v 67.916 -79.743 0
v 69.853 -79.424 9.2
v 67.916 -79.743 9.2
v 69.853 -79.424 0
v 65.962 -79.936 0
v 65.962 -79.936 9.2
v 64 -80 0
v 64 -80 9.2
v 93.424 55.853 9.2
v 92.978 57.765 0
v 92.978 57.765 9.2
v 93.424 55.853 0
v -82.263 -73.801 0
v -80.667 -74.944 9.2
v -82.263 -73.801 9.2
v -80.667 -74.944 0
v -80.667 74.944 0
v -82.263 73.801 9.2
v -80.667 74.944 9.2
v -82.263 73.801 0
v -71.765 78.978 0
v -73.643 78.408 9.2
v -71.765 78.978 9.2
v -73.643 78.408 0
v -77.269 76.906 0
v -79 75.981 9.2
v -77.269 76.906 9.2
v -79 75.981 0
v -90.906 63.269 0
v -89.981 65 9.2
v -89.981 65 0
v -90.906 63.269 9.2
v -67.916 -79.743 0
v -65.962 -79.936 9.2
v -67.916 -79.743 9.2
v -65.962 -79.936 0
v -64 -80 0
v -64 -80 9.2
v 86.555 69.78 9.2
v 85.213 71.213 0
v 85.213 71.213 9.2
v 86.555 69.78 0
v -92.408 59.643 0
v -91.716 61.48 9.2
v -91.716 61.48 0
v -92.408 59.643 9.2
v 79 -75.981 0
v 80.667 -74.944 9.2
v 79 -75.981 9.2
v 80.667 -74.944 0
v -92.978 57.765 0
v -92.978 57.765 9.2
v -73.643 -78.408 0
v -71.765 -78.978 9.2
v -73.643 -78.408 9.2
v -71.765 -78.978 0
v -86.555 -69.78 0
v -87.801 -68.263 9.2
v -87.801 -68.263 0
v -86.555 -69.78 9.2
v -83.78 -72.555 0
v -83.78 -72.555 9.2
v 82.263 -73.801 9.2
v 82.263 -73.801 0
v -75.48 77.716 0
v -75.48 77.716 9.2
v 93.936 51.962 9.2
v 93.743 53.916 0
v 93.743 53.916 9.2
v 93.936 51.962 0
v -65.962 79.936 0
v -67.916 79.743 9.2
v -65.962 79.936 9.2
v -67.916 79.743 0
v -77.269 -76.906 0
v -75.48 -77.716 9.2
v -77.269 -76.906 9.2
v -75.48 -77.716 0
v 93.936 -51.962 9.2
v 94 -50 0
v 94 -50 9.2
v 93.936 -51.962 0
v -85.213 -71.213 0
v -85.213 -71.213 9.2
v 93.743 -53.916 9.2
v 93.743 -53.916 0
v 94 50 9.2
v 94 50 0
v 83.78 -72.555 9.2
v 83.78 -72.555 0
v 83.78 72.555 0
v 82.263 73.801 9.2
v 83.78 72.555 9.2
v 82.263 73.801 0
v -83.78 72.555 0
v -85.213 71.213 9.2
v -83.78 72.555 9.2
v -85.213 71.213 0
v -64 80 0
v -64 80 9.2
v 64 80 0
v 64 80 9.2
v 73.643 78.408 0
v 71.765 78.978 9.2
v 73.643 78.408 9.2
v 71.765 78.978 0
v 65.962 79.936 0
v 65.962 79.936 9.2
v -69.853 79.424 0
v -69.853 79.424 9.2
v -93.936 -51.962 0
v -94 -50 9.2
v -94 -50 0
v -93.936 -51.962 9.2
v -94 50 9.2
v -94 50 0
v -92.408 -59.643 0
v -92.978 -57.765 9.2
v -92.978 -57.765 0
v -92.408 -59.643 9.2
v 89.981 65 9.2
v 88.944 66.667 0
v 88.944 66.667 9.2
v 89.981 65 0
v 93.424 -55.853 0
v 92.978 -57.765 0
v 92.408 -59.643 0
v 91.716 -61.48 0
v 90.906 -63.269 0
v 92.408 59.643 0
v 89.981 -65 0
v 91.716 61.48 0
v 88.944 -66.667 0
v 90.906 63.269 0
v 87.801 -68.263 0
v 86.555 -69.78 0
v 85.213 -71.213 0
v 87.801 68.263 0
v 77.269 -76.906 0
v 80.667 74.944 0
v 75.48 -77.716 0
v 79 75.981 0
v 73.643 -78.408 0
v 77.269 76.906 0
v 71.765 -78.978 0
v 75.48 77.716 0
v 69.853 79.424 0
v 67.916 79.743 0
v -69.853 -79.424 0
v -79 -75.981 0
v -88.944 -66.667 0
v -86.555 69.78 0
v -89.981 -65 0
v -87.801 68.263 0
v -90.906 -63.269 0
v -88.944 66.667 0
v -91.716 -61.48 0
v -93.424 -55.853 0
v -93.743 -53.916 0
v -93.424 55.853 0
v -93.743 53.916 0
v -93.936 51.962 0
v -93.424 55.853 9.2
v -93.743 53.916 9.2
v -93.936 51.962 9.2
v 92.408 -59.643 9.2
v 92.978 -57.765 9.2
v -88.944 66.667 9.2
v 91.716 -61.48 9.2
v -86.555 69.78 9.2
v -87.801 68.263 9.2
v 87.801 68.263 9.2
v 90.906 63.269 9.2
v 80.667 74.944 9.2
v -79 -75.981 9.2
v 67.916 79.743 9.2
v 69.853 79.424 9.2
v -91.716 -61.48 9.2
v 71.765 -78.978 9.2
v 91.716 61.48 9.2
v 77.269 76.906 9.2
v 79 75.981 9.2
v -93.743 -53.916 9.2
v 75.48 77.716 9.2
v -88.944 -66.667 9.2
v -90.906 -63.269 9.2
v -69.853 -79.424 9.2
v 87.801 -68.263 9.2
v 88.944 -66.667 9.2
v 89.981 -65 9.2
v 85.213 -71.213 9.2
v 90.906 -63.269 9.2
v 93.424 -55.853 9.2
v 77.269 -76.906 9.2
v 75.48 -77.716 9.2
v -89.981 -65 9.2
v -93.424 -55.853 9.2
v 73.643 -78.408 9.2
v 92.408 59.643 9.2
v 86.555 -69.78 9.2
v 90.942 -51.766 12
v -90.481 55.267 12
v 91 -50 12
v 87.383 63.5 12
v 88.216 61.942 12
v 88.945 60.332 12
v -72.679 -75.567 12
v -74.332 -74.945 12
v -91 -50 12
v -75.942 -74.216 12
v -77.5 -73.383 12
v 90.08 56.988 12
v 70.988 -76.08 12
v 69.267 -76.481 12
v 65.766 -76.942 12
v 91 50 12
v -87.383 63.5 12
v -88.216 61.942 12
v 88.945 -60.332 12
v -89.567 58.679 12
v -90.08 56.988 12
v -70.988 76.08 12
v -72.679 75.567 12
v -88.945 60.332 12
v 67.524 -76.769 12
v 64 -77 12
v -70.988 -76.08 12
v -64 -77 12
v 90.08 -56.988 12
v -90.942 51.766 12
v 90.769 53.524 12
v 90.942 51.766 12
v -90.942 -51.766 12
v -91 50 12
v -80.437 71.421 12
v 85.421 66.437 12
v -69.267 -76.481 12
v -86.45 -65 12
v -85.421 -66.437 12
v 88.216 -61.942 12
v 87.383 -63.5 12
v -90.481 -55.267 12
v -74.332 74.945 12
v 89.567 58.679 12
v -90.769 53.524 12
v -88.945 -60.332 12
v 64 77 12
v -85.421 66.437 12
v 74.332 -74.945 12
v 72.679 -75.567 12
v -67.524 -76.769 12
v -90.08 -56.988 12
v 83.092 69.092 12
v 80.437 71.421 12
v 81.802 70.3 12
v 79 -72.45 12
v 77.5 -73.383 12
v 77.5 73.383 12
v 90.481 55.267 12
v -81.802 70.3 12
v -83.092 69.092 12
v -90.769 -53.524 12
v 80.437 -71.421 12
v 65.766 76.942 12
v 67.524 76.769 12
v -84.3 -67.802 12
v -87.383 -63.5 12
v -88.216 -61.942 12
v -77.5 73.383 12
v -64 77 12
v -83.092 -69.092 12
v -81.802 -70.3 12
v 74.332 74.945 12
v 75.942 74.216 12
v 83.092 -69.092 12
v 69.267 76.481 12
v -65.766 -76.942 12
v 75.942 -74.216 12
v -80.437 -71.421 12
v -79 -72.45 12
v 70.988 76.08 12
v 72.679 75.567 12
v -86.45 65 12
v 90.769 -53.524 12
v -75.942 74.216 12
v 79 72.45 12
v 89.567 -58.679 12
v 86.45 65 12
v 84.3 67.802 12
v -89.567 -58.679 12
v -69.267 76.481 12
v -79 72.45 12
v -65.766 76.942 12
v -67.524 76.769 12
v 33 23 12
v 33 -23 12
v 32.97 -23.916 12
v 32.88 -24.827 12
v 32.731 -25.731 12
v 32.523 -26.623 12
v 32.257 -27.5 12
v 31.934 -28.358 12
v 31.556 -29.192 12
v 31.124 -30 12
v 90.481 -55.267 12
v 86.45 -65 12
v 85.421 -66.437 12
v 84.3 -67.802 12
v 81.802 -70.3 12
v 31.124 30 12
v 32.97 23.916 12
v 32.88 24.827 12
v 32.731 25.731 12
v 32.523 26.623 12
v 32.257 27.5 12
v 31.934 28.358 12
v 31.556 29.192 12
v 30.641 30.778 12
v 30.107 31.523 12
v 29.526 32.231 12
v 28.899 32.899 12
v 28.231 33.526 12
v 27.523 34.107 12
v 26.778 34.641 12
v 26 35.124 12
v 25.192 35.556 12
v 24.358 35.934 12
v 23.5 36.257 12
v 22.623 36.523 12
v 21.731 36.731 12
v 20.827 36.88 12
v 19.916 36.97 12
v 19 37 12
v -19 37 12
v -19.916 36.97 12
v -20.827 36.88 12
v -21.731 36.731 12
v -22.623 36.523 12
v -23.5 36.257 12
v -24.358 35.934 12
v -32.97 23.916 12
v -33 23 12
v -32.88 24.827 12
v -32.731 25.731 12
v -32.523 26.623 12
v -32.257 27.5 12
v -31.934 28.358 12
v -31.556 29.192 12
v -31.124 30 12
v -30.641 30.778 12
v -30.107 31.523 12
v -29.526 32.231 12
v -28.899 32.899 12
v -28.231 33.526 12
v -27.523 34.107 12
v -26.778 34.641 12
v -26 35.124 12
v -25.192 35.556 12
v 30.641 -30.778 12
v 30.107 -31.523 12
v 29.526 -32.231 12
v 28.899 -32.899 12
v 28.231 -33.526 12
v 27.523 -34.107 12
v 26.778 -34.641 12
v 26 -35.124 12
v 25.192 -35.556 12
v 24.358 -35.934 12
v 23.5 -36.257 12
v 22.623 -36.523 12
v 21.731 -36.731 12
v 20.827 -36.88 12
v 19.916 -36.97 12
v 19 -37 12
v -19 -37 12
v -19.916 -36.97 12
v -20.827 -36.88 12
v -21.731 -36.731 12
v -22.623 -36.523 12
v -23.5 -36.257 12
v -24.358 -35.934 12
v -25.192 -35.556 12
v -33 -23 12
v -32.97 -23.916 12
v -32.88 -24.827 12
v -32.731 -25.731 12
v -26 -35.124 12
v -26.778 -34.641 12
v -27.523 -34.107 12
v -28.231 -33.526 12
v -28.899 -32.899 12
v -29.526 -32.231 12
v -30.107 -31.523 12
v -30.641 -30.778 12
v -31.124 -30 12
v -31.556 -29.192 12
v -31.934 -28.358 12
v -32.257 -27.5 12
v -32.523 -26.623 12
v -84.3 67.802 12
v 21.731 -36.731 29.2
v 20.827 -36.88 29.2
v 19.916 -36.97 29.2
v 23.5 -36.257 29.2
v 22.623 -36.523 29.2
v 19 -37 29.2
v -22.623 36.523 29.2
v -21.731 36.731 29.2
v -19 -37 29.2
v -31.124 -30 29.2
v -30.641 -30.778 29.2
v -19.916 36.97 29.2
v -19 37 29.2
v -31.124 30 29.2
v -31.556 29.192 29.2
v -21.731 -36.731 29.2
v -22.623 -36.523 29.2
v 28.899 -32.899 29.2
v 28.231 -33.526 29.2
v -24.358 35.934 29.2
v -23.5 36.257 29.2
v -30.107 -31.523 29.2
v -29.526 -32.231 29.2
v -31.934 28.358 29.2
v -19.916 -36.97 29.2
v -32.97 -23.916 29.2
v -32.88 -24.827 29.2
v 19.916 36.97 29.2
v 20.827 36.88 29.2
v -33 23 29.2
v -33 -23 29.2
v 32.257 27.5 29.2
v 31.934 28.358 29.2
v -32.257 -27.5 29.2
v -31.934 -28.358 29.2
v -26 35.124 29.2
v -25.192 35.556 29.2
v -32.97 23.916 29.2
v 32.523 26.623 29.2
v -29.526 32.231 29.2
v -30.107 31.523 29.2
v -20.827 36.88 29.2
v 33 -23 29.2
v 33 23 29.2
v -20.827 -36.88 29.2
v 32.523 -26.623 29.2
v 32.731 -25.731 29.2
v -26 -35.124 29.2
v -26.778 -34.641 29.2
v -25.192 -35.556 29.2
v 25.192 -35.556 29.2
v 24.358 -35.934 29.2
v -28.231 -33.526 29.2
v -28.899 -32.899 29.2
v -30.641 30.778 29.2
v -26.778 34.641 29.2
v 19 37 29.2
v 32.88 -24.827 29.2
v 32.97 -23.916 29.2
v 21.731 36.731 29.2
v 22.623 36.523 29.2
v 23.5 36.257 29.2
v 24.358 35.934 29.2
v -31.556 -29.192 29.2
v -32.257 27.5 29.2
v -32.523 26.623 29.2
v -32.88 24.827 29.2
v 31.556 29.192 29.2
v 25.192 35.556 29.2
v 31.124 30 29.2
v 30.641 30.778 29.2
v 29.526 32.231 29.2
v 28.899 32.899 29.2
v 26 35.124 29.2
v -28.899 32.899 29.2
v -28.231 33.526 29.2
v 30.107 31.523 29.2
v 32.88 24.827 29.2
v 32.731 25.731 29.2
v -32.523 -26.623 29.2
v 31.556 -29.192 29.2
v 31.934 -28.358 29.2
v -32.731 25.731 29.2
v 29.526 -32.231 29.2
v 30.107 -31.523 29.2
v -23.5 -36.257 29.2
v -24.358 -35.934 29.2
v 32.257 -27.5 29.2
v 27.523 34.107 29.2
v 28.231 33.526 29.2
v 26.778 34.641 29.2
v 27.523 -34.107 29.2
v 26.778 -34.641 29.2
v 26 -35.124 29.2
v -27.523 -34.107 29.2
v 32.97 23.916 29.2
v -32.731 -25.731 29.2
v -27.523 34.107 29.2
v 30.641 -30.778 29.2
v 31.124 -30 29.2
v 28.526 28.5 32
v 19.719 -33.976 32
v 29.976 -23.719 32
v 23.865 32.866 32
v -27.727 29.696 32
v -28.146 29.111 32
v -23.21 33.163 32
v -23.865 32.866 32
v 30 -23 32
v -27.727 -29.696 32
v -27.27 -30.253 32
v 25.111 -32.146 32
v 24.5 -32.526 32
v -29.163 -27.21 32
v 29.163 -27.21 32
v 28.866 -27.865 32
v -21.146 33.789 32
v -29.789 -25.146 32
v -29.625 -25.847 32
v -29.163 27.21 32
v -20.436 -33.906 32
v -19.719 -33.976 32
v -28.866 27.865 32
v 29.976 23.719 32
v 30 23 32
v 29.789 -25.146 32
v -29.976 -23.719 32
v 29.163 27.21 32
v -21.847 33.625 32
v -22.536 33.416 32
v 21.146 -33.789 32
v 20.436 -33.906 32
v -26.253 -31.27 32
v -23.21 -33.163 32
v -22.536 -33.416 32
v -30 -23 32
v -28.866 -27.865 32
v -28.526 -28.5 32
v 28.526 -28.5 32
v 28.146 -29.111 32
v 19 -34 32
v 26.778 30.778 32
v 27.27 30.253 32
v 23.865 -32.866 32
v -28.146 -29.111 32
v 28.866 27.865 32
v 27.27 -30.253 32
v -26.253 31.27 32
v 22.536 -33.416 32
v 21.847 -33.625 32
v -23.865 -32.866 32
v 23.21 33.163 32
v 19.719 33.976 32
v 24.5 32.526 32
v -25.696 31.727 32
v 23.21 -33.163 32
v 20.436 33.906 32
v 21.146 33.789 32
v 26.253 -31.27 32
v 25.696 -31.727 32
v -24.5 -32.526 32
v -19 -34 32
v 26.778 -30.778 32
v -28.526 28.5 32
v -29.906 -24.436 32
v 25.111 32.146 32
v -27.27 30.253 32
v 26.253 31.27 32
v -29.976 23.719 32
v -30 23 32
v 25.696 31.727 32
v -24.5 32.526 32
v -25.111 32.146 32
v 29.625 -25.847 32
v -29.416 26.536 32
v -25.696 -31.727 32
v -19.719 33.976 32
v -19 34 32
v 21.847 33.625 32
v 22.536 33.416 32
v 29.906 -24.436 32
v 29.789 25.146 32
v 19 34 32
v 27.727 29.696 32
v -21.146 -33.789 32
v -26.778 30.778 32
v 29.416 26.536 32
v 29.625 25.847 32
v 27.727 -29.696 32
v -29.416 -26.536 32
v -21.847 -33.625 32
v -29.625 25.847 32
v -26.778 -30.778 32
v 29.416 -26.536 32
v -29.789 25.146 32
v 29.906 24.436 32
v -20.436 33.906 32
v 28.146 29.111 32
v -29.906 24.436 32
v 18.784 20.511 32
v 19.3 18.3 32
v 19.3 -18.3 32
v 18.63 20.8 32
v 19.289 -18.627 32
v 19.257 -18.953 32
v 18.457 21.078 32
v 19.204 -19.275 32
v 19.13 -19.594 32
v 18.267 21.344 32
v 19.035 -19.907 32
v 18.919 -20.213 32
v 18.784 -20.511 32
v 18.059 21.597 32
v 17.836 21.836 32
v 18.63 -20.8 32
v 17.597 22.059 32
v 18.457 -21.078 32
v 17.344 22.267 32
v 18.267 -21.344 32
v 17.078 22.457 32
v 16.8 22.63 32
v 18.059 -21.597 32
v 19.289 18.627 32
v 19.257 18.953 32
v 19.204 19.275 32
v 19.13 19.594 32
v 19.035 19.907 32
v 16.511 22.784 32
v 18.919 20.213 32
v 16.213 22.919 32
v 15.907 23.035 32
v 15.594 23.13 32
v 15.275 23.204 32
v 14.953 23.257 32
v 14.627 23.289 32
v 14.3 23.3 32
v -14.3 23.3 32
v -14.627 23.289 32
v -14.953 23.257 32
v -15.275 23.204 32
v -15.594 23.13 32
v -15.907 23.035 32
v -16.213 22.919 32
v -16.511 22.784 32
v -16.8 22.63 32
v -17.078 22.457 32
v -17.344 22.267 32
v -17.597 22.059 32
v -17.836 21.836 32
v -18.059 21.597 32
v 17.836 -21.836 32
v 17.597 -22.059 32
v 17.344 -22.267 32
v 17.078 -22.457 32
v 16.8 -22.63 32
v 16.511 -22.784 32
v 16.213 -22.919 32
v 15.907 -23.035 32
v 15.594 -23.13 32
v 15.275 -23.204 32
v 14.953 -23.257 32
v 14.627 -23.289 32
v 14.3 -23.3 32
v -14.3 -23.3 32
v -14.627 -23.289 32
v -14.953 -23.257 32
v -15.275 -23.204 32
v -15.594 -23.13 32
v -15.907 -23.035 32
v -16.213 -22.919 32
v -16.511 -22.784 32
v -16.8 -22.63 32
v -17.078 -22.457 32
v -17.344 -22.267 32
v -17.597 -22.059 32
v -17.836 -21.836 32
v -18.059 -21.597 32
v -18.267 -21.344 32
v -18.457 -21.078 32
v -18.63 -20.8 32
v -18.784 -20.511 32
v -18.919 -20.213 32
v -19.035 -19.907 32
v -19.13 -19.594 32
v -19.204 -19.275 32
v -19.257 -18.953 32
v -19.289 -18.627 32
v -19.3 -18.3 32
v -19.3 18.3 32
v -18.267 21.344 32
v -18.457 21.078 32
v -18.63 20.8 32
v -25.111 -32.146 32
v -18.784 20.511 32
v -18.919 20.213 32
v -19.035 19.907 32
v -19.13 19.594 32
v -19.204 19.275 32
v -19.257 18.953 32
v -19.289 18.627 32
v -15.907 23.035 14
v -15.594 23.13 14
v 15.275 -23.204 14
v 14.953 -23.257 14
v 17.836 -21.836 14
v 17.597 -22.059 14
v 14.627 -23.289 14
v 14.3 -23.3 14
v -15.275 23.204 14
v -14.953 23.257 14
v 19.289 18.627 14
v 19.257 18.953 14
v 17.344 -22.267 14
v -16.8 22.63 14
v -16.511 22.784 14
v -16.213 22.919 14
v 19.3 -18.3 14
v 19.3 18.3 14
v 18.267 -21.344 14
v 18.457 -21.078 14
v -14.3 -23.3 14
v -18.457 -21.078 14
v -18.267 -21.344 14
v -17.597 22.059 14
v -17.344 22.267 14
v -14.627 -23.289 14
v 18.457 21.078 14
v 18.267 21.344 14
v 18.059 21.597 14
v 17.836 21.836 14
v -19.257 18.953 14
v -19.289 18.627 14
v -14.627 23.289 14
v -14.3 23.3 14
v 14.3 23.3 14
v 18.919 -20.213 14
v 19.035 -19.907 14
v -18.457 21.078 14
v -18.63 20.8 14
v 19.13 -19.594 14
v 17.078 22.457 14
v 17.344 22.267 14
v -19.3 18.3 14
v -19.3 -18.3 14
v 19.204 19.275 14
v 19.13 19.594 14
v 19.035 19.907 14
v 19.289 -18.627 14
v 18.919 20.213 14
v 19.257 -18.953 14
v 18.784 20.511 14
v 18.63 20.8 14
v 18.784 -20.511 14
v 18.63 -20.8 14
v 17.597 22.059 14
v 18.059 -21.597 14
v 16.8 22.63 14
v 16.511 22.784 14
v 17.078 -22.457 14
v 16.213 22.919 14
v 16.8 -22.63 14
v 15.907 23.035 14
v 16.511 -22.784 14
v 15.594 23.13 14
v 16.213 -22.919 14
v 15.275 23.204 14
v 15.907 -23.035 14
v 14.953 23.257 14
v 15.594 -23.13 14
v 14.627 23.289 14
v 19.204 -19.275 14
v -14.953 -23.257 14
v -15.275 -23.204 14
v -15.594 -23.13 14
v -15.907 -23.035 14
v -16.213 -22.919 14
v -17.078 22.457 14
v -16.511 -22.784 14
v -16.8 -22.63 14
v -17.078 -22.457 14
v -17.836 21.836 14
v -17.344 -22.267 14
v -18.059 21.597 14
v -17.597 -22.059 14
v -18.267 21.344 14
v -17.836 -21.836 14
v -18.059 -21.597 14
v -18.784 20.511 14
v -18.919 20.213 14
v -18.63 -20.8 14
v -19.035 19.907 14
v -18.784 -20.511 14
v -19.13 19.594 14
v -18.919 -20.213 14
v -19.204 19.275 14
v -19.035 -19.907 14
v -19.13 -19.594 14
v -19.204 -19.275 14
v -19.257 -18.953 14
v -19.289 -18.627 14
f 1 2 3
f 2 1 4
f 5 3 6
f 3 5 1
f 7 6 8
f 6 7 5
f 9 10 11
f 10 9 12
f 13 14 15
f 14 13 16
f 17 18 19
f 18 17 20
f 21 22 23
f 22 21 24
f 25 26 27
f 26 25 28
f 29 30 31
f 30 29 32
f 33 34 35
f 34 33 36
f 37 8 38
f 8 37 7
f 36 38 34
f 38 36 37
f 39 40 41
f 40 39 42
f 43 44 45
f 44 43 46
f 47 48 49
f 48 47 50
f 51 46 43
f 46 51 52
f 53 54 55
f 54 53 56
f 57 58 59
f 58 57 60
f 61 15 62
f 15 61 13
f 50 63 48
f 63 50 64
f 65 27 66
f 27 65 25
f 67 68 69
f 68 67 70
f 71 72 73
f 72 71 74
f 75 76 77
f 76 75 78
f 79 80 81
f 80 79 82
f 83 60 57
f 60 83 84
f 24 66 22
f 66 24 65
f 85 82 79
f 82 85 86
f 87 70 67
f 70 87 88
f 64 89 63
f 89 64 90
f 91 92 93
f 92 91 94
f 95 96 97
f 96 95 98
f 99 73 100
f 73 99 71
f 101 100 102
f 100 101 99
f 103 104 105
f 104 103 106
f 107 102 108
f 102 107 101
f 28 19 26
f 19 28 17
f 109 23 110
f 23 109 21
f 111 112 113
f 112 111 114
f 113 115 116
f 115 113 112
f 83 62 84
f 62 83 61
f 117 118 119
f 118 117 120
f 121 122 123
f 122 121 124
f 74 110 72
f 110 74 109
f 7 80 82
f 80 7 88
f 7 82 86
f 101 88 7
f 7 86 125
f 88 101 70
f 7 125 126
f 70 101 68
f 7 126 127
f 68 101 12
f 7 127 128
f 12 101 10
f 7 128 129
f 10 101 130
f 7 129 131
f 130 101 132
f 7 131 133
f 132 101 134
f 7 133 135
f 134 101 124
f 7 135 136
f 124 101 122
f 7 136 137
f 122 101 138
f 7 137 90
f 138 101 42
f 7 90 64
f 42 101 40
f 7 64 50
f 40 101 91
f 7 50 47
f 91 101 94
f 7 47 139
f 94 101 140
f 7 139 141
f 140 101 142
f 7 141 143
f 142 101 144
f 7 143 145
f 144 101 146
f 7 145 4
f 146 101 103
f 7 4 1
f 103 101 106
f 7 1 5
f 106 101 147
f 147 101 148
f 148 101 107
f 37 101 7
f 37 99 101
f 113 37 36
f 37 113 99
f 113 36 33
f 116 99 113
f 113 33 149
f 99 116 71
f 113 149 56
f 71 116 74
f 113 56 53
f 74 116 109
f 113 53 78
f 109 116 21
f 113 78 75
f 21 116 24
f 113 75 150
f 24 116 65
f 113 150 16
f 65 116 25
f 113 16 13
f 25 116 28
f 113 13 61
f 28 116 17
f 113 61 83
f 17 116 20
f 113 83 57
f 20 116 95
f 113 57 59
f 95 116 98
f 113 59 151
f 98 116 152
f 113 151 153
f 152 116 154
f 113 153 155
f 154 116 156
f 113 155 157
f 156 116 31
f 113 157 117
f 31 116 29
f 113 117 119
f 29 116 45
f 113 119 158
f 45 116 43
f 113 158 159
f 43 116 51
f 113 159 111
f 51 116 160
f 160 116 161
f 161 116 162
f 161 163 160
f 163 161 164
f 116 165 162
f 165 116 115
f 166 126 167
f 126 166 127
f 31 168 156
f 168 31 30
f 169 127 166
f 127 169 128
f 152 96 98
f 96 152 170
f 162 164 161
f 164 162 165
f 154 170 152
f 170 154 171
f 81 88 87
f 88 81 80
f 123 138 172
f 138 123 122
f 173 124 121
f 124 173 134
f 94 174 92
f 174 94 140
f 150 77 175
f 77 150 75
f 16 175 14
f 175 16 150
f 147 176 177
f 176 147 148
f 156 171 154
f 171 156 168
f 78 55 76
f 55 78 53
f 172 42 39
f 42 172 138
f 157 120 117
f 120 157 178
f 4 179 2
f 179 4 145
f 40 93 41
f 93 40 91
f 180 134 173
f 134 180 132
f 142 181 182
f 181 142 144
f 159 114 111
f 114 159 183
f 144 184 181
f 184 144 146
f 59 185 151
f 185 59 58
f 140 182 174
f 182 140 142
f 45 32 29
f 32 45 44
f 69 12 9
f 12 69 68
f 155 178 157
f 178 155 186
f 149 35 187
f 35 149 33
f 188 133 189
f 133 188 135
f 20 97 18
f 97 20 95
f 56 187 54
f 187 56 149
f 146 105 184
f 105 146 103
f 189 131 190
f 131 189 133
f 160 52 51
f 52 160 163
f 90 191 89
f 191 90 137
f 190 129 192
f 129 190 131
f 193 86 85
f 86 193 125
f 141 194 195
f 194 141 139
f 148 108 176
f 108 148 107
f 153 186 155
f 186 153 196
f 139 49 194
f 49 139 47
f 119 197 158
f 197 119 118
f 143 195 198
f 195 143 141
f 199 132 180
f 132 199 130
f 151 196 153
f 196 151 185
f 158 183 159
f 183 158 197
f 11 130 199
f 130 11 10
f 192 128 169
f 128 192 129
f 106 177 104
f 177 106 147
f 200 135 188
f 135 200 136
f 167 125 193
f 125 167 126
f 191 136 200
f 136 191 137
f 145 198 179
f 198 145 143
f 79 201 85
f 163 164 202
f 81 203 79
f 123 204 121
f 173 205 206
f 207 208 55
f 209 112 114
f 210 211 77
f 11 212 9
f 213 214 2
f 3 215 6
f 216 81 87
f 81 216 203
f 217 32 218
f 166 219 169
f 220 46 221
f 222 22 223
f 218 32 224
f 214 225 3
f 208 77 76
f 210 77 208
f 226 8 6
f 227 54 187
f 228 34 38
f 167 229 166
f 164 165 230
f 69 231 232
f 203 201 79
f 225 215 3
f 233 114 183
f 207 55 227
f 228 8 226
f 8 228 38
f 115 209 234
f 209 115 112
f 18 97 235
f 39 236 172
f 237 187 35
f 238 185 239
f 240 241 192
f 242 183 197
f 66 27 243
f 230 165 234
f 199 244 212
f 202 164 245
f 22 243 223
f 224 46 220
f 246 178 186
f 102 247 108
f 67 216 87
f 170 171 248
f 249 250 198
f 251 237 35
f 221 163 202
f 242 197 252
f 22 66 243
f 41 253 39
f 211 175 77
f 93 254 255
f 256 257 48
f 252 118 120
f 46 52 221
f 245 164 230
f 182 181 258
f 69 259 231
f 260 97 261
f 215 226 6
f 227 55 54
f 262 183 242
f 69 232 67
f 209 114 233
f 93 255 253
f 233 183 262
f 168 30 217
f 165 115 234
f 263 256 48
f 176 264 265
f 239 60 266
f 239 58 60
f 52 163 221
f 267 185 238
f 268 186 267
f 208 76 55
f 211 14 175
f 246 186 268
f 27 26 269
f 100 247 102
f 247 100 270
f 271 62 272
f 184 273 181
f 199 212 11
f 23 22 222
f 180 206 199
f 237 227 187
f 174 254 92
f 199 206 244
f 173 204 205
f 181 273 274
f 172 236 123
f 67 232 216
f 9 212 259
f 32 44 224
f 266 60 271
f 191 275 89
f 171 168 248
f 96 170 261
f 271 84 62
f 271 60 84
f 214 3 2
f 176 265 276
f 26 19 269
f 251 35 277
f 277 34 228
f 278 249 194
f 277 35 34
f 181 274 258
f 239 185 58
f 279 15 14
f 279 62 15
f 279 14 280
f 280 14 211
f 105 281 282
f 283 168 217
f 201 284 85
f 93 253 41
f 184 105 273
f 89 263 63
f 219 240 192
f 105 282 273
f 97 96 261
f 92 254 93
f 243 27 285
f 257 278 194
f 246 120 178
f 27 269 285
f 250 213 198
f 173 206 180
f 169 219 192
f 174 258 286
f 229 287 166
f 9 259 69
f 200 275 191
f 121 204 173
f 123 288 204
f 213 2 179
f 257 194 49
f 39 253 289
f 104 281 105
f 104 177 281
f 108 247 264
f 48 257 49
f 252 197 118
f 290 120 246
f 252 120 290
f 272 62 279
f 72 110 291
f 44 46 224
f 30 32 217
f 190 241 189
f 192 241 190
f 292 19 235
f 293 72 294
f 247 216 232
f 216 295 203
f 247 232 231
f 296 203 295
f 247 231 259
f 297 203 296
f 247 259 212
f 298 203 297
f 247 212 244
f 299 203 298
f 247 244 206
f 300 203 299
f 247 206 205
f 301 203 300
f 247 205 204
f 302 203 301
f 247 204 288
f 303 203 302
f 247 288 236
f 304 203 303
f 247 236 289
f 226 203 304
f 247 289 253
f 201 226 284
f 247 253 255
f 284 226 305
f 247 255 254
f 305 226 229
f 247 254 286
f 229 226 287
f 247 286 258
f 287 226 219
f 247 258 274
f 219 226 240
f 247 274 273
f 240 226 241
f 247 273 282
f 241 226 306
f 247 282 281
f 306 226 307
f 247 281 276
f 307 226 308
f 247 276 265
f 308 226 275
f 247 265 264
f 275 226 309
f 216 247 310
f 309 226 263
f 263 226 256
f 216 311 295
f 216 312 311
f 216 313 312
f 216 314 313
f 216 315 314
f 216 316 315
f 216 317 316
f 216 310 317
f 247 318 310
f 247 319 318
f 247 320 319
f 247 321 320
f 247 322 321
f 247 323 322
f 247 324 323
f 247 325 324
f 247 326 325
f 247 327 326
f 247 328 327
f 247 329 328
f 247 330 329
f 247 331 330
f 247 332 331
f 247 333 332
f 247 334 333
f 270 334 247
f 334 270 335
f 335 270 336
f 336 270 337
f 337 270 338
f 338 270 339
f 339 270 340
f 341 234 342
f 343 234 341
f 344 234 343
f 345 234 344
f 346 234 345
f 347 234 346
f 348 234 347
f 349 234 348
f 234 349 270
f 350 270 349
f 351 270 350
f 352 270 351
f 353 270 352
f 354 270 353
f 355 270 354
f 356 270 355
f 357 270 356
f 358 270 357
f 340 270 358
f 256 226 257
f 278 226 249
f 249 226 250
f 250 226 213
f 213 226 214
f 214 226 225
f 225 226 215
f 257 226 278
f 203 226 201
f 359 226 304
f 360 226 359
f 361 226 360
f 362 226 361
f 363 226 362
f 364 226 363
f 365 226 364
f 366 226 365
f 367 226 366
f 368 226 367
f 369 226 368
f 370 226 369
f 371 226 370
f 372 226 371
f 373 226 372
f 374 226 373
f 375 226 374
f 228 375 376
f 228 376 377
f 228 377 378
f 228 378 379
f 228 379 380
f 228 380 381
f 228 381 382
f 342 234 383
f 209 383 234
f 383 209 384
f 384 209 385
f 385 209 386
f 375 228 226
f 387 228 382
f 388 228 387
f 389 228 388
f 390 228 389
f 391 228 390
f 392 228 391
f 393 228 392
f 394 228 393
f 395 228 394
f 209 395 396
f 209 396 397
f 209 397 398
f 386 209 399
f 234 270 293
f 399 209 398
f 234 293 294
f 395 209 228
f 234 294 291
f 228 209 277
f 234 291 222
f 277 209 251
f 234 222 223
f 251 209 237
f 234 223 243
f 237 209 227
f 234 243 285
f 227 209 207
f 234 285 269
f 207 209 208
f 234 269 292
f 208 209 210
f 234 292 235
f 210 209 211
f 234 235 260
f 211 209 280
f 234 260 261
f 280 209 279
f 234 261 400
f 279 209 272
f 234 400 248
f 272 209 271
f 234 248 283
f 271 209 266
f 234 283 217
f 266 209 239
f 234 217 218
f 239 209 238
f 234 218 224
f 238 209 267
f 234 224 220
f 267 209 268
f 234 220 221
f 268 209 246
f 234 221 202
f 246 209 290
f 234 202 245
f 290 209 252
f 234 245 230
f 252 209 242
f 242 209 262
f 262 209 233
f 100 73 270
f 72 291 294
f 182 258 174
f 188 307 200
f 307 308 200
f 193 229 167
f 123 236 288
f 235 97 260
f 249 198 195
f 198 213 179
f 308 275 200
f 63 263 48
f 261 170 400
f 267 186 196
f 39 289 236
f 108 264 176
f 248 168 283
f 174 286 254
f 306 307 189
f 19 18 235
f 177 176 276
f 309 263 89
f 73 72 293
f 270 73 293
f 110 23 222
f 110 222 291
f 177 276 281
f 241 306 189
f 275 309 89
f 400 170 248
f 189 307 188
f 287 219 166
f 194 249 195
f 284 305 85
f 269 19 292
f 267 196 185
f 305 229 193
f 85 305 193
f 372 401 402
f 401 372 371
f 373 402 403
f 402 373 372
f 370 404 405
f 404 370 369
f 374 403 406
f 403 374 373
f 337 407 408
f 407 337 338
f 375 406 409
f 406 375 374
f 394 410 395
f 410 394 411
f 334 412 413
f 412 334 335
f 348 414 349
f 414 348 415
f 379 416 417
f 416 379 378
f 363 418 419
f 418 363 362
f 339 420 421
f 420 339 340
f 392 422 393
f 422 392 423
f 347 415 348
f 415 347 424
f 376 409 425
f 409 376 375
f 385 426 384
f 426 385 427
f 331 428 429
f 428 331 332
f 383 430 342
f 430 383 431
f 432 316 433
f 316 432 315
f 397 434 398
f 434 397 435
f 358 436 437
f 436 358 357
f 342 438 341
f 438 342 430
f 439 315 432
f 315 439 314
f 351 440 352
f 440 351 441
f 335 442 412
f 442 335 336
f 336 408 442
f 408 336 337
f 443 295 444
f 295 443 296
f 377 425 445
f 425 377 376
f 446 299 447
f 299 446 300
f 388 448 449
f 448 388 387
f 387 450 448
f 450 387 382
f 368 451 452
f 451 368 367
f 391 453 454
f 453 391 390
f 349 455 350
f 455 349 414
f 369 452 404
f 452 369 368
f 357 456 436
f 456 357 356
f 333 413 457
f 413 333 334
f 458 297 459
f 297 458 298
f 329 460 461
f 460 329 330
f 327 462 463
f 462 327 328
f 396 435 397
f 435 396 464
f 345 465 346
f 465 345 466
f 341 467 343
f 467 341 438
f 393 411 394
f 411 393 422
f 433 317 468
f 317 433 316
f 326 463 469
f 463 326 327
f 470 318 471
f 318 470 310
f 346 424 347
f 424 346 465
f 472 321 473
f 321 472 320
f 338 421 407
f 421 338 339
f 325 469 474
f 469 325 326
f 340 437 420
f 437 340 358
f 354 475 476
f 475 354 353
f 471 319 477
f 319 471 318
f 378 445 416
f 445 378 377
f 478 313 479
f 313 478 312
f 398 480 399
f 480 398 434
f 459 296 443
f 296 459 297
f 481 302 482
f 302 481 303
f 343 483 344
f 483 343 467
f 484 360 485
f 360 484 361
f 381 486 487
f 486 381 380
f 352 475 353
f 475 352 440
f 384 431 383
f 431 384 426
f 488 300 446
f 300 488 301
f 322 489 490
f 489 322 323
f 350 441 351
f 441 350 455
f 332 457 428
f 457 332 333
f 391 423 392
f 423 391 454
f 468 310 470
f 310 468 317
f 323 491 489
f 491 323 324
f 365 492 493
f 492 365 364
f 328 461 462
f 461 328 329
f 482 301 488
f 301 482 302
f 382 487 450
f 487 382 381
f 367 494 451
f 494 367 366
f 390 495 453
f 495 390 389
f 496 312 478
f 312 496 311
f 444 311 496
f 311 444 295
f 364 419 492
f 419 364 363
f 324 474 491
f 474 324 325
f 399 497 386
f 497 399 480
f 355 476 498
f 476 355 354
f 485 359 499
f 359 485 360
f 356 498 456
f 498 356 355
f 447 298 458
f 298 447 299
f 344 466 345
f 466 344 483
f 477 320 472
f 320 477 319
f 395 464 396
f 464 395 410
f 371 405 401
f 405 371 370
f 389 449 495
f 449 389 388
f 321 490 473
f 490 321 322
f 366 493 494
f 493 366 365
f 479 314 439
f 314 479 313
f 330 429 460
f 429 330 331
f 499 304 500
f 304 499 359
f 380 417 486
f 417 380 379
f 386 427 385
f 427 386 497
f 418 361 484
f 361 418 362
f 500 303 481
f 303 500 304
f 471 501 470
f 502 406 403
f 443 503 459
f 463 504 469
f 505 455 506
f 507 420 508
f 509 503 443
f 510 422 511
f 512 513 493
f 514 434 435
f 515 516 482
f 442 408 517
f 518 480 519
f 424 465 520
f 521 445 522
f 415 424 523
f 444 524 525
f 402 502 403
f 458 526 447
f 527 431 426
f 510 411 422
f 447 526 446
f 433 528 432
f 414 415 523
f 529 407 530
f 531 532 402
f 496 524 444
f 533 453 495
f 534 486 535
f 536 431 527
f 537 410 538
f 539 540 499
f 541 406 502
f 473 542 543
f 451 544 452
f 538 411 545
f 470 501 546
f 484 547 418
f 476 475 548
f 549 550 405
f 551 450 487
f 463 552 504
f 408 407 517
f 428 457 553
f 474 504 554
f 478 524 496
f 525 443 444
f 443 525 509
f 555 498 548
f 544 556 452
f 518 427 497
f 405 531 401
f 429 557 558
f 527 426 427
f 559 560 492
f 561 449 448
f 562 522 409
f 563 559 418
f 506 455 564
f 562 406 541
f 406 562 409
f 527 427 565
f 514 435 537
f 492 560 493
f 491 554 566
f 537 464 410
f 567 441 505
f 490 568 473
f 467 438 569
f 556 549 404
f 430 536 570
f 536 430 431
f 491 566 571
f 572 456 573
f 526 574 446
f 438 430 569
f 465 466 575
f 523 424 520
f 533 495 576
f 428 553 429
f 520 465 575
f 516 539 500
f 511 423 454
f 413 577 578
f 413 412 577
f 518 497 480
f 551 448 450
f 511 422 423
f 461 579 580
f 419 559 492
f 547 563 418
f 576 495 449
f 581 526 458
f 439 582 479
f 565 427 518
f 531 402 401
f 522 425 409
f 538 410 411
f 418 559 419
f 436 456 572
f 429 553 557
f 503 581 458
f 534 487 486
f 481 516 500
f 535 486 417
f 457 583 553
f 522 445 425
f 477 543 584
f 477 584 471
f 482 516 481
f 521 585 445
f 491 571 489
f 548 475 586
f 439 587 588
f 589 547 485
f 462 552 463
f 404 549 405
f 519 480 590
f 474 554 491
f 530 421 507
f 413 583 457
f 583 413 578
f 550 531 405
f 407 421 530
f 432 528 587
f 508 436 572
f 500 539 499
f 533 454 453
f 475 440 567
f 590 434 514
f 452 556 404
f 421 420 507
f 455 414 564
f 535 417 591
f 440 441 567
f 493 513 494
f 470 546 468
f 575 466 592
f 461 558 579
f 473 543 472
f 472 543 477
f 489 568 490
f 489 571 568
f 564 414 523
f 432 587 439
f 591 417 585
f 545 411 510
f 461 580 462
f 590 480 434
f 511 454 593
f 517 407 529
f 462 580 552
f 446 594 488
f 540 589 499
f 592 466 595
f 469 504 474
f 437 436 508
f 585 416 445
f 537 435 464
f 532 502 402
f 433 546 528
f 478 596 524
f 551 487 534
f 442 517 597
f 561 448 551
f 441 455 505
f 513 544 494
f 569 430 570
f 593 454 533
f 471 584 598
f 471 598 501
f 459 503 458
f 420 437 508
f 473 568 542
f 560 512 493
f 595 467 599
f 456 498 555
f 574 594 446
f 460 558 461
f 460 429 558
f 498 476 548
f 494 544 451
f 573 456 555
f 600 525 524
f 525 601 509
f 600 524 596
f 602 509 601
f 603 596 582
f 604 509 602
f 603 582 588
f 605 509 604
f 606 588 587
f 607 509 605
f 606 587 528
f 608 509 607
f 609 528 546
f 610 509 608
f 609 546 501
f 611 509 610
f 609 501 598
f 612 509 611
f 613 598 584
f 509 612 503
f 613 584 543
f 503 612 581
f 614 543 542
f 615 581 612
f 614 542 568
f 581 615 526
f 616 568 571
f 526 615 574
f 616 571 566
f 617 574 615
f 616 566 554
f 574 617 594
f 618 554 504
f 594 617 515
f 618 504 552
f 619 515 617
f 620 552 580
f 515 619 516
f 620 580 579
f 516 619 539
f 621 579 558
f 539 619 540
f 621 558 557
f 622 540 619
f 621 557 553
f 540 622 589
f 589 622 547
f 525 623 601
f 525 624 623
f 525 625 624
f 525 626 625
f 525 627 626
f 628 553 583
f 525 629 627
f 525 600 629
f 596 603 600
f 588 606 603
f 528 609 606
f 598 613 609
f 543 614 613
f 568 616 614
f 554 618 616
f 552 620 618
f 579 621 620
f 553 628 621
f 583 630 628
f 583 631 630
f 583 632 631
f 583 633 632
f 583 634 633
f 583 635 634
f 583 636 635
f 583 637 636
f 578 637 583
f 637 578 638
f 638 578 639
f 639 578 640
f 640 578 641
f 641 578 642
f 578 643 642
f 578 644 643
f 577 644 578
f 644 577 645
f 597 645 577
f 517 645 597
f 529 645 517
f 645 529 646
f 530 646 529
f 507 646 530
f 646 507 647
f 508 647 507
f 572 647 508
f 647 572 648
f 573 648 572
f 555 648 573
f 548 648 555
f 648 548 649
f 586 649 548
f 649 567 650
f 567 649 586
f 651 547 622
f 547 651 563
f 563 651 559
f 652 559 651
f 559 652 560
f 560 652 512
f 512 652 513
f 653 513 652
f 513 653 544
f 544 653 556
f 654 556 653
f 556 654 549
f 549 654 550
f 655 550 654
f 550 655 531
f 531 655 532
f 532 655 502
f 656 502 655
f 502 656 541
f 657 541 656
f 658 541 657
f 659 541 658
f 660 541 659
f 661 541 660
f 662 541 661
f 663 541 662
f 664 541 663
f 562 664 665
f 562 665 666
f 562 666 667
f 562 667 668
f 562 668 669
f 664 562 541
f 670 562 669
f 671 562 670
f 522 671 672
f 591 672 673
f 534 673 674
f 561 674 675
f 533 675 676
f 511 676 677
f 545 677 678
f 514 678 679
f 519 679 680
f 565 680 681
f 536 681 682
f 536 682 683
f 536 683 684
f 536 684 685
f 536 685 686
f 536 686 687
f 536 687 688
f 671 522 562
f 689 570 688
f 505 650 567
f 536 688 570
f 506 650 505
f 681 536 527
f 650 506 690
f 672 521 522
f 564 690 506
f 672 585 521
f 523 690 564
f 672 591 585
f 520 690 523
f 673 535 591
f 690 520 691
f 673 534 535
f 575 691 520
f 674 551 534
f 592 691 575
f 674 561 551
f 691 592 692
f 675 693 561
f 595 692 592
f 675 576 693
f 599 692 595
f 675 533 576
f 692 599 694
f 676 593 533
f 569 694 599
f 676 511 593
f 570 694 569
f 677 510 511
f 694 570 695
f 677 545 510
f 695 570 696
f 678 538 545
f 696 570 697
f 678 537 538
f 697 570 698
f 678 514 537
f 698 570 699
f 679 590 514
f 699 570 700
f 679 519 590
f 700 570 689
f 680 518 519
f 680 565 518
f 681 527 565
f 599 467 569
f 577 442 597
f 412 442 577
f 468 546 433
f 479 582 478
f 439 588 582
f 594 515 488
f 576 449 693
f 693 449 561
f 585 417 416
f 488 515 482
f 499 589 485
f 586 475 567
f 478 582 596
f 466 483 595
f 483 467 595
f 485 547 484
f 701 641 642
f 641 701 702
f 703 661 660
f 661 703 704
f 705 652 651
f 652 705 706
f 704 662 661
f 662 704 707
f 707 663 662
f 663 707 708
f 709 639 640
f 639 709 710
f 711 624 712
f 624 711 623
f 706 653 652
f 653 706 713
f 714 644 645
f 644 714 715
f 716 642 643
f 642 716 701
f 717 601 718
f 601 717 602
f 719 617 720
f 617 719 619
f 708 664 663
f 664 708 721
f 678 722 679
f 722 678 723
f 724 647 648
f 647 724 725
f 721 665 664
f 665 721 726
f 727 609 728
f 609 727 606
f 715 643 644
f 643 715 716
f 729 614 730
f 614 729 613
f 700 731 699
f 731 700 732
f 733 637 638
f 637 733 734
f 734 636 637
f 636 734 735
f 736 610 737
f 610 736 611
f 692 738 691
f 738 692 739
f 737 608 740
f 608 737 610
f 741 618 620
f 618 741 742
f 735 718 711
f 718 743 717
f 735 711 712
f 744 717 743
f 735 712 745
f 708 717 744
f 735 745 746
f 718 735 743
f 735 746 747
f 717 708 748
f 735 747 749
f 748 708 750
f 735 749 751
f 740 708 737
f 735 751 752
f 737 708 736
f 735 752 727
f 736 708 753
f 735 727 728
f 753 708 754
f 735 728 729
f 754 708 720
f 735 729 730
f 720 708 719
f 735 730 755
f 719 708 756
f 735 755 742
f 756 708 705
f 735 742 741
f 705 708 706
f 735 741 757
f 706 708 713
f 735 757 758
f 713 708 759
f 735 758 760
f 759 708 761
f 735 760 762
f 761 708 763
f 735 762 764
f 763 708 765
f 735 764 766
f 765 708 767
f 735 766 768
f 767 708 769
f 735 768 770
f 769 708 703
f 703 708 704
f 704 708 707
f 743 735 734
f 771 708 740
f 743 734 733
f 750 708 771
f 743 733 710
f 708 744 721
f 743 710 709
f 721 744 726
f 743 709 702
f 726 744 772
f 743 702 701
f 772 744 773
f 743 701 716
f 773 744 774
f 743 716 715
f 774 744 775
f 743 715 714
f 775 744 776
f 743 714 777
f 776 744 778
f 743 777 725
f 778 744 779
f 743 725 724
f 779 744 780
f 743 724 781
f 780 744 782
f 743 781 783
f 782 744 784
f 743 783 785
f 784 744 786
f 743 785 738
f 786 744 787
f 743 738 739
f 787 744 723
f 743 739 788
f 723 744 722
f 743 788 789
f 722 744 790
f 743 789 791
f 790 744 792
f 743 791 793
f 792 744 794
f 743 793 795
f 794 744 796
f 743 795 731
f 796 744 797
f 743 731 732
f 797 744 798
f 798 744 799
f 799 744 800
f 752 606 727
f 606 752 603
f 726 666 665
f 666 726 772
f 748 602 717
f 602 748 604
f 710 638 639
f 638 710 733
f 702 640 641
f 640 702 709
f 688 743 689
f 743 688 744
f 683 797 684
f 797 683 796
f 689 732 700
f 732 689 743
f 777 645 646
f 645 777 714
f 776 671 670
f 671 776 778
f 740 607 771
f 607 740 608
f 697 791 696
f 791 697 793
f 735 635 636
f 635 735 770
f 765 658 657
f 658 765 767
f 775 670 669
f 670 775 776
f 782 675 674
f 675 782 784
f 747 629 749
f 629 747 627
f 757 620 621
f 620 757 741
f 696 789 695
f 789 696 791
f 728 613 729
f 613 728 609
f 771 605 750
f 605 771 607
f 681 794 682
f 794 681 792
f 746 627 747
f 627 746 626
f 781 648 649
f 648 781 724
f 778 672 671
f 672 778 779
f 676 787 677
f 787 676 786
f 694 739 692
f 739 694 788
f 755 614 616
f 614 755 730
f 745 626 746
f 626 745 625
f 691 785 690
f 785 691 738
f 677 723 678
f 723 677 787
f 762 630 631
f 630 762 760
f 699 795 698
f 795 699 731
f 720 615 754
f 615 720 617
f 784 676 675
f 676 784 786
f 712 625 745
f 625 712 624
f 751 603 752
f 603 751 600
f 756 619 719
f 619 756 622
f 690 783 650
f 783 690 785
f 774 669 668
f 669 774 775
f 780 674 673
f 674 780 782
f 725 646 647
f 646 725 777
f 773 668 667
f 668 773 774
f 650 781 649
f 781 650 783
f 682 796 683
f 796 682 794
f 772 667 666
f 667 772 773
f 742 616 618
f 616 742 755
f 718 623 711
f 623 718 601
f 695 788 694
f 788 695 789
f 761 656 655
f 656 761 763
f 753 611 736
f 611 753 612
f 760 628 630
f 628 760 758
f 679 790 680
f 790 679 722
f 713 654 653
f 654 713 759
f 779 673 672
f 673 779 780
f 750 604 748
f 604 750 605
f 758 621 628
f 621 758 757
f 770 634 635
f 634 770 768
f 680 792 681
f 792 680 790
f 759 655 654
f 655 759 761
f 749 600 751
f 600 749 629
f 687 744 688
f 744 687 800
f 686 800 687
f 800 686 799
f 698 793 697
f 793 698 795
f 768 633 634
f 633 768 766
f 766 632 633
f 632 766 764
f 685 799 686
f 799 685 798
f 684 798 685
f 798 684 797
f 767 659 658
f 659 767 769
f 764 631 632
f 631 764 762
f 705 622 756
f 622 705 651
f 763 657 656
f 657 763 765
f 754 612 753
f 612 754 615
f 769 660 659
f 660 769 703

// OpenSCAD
// Headphone stand in three printable parts: base, post, hanger.
// No glue, no screws. Rectangular (non-round) blade tenons prevent spinning.
// All dimensions in mm. Print orientation is the exported orientation (+Z up).
//
// Assembly heights (assembly coordinates, desk at z=0):
//   base plate/boss top        0 .. 32
//   post                       14.5 .. 250  (17.5 mm of it inside the base socket)
//   hanger tenon               228.5 .. 250 (21.5 mm inside the post socket)
//   hanger saddle top centre   270
// Socket clearances: 0.3 mm per side (socket is tenon + 0.6 in each dimension),
// tenon tips stop 0.5 mm above socket floors; shoulders/faces give the depth stop
// for the hanger, and the post bottoms in its socket.

part = "base"; // [base, post, hanger, assembly]
cadverify_only = "";

$fn = 96;

/* [Base] */
base_w = 188;          // desk footprint, X
base_d = 160;          // desk footprint, Y
base_plate_top = 9;    // straight plate wall up to here, then 45 deg chamfer to 12
base_top_plate = 12;
boss_w = 66;
boss_d = 74;
boss_straight_top = 29; // then 45 deg chamfer to boss_top
boss_top = 32;
base_socket_w = 38.6;  // post 38 + 0.6
base_socket_d = 46.6;  // post 46 + 0.6
base_socket_floor = 14;

/* [Post] */
post_w = 38;
post_d = 46;
post_len = 235.5;      // tip (local z=0) to top (assembly 250)
post_top_socket_w = 24.6; // hanger tenon 24 + 0.6
post_top_socket_d = 34.6; // hanger tenon 34 + 0.6
post_top_socket_floor_local = 213.5; // assembly 228

/* [Hanger, modelled in print coordinates] */
// Print coordinates: X = saddle length, Y = height above tenon tip,
// Z = saddle width direction (part lies on its Z=0 side face on the bed).
hang_len_half = 69;    // overall saddle half length incl. rounded end point
hang_width = 34;       // >= 30 mm headband support width
hang_top_rel = 41.5;   // tenon tip to saddle crown; assembly 228.5 + 41.5 = 270
hang_arc_r = 170;      // crown radius of the headband contact surface
hang_plate_t = 10;     // saddle plate thickness (vertical, in profile)
hang_tenon_half_w = 12;  // tenon is 24 (X) x 34 (width)
hang_shoulder_rel = 21.5; // assembly 250, post top
hang_neck_half_w = 17;

function hang_top_z(x) = hang_top_rel - (hang_arc_r - sqrt(hang_arc_r*hang_arc_r - x*x));
function hang_bot_z(x) = hang_top_z(x) - hang_plate_t;

module rounded_rect(w, d, r) {
    offset(r = r) square([w - 2*r, d - 2*r], center = true);
}

module instance(name, part_name, unit = 1) {
    echo(cadverify_instance = [name, part_name, unit]);
    if (cadverify_only == "" || cadverify_only == name) children();
}

/* ---------- BASE (print = assembly orientation) ---------- */
module base_part() {
    difference() {
        // Outer corners of the plate and boss are rounded in plan view (corner
        // radius >= 6 mm) and the top rims have 45 deg x 3 mm chamfers, so
        // nothing sticks out beyond the bounding box or the support plane.
        union() {
            // desk plate with 45 deg top edge chamfer
            linear_extrude(base_plate_top) rounded_rect(base_w, base_d, 30);
            hull() {
                translate([0, 0, base_plate_top]) linear_extrude(0.2)
                    rounded_rect(base_w, base_d, 30);
                translate([0, 0, base_top_plate - 0.2]) linear_extrude(0.2)
                    rounded_rect(base_w - 6, base_d - 6, 27);
            }
            // raised boss / collar around the post socket, 45 deg top chamfer
            translate([0, 0, base_top_plate])
                linear_extrude(boss_straight_top - base_top_plate)
                    rounded_rect(boss_w, boss_d, 14);
            hull() {
                translate([0, 0, boss_straight_top]) linear_extrude(0.2)
                    rounded_rect(boss_w, boss_d, 14);
                translate([0, 0, boss_top - 0.2]) linear_extrude(0.2)
                    rounded_rect(boss_w - 6, boss_d - 6, 11);
            }
        }
        // blind rectangular socket for the post (stops post spinning)
        translate([0, 0, base_socket_floor])
            linear_extrude(boss_top - base_socket_floor + 2)
                rounded_rect(base_socket_w, base_socket_d, 5);
    }
}

/* ---------- POST (printed upright, local z=0 is tenon tip) ---------- */
module post_part() {
    difference() {
        linear_extrude(post_len) rounded_rect(post_w, post_d, 8);
        // blind rectangular socket in the top for the hanger blade tenon
        translate([0, 0, post_top_socket_floor_local])
            linear_extrude(post_len - post_top_socket_floor_local + 2)
                rounded_rect(post_top_socket_w, post_top_socket_d, 5);
    }
}

/* ---------- HANGER (printed on its side) ---------- */
module hanger_part() {
    top_pts    = [for (x = [56 : -8 : -56]) [x, hang_top_z(x)]];
    bot_r_pts  = [for (x = [40 : 8 : 64]) [x, hang_bot_z(x)]];
    bot_l_pts  = [for (x = [-64 : 8 : -40]) [x, hang_bot_z(x)]];
    mid64 = (hang_top_z(64) + hang_bot_z(64)) / 2;
    // Saddle/neck profile above the shoulder plane (print y = hang_shoulder_rel).
    profile = concat(
        [[-hang_neck_half_w, hang_shoulder_rel], [hang_neck_half_w, hang_shoulder_rel],
         [30, hang_bot_z(30)]],
        bot_r_pts,
        [[hang_len_half - 0.5, mid64], [64, hang_top_z(64)]],
        top_pts,
        [[-64, hang_top_z(64)], [-(hang_len_half - 0.5), mid64], [-64, hang_bot_z(64)]],
        bot_l_pts,
        [[-30, hang_bot_z(30)]]
    );
    difference() {
        union() {
            linear_extrude(hang_width) polygon(profile);
            // Blade tenon below the shoulder: 24 x 34 with 4 mm corner radii,
            // so it clears the post socket's 5 mm rounded corners. It reaches
            // 2 mm up into the neck so the union is volumetric, not face-only.
            translate([0, 0, hang_width/2]) rotate([-90, 0, 0])
                linear_extrude(hang_shoulder_rel + 2)
                    rounded_rect(2*hang_tenon_half_w, hang_width, 4);
        }
        // 45 deg chamfers on the two crown side edges, limited to the central
        // contact zone |x| <= 36: the box spans start at x = +-36, meet at the
        // edge point (|x|, crown) = (36, hang_top_z(36)) and stop 3 mm inside
        // the crown (tangency point), so the chamfer widens the crown flat to
        // 3 mm at |x| = 36+ and the plate keeps full width beyond it.
        // far side: keeps Z + Y <= hang_top_z(36) + hang_width
        translate([0, hang_top_z(36) + hang_width, hang_width]) rotate([135, 0, 0])
            translate([-36, 0, 0]) cube([72, 40, 40]);
        // bed side: keeps Z - Y >= -hang_top_z(36)
        translate([0, hang_top_z(36), 0]) rotate([-135, 0, 0])
            translate([-36, 0, 0]) cube([72, 40, 40]);
    }
}

/* ---------- Spec echoes ---------- */
if (part == "base") {
    echo(cadverify_spec = [
        ["bounds", [[-base_w/2, -base_d/2, 0], [base_w/2, base_d/2, boss_top]]],
        ["bodies", 1],
        ["through_holes", 0],
        ["support_faces", [["desk", "-z", 25000]]],
        ["overhangs_allowed", []],
        ["copies", 1],
        ["details", [
            ["plate", "material", [[-80, -60, 2], [80, 60, 10]], 0.99],
            ["boss_wall", "material", [[22, -30, 16], [31, 30, 28]], 0.99],
            ["post_socket", "void", [[-17, -21, 16], [17, 21, 30]], 0.99],
            ["socket_floor", "thickness", [0, 0, 42], [0, 0, -1], base_socket_floor],
            ["boss_socket_top", "view", [[-34, -38, 27], [34, 38, boss_top]]]
        ]]
    ]);
} else if (part == "post") {
    echo(cadverify_spec = [
        ["bounds", [[-post_w/2, -post_d/2, 0], [post_w/2, post_d/2, post_len]]],
        ["bodies", 1],
        ["through_holes", 0],
        ["support_faces", [["bed", "-z", 1500]]],
        ["overhangs_allowed", []],
        ["copies", 1],
        ["details", [
            ["column", "material", [[-16, -20, 30], [16, 20, 200]], 0.99],
            ["hanger_socket", "void", [[-10, -15, 216], [10, 15, 234]], 0.99],
            ["column_width", "thickness", [32, 0, 100], [-1, 0, 0], post_w],
            ["top_socket", "view", [[-19, -23, 210], [19, 23, post_len]]]
        ]]
    ]);
} else if (part == "hanger") {
    // actual extreme points are the saddle end tips at +-(hang_len_half - 0.5)
    echo(cadverify_spec = [
        ["bounds", [[-(hang_len_half - 0.5), 0, 0], [hang_len_half - 0.5, hang_top_rel, hang_width]]],
        ["bodies", 1],
        ["through_holes", 0],
        ["support_faces", [["bed", "-z", 1200]]],
        ["overhangs_allowed", [
            ["45deg crown chamfer on bed side", [[-36, 37, 0], [36, hang_top_rel, 5]]]
        ]],
        ["copies", 1],
        ["details", [
            ["saddle_plate", "material", [[-25, 32, 5], [25, 38, 29]], 0.99],
            ["tenon", "material", [[-10, 2, 5], [10, 20, 29]], 0.99],
            ["saddle_thickness", "thickness", [50, 52, 17], [0, -1, 0], hang_plate_t],
            ["rounded_crown", "view", [[-40, 27, 0], [40, hang_top_rel, hang_width]]]
        ]]
    ]);
} else if (part == "assembly") {
    echo(cadverify_spec = [
        ["bounds", [[-base_w/2, -base_d/2, 0], [base_w/2, base_d/2, 270]]],
        ["support_faces", [["desk", "-z", 25000]]],
        ["allowed_interferences", []],
        ["assembly_order", [
            [["base"], [0, 0, 0]],
            [["post"], [0, 0, -1]],
            [["hanger"], [0, 0, -1]]
        ]]
    ]);
}

/* ---------- Output ---------- */
if (part == "base") {
    base_part();
} else if (part == "post") {
    post_part();
} else if (part == "hanger") {
    hanger_part();
} else if (part == "assembly") {
    instance("base", "base") base_part();
    instance("post", "post") translate([0, 0, 14.5]) post_part();
    // hanger print coords (x, y=height rel. tenon tip, z=width)
    //   -> assembly (x, 17-z, 228.5+y): tenon tip at 228.5, crown at 270
    instance("hanger", "hanger")
        translate([0, hang_width/2, 228.5]) rotate([90, 0, 0]) hanger_part();
} else {
    assert(false, str("unknown part: ", part));
}
